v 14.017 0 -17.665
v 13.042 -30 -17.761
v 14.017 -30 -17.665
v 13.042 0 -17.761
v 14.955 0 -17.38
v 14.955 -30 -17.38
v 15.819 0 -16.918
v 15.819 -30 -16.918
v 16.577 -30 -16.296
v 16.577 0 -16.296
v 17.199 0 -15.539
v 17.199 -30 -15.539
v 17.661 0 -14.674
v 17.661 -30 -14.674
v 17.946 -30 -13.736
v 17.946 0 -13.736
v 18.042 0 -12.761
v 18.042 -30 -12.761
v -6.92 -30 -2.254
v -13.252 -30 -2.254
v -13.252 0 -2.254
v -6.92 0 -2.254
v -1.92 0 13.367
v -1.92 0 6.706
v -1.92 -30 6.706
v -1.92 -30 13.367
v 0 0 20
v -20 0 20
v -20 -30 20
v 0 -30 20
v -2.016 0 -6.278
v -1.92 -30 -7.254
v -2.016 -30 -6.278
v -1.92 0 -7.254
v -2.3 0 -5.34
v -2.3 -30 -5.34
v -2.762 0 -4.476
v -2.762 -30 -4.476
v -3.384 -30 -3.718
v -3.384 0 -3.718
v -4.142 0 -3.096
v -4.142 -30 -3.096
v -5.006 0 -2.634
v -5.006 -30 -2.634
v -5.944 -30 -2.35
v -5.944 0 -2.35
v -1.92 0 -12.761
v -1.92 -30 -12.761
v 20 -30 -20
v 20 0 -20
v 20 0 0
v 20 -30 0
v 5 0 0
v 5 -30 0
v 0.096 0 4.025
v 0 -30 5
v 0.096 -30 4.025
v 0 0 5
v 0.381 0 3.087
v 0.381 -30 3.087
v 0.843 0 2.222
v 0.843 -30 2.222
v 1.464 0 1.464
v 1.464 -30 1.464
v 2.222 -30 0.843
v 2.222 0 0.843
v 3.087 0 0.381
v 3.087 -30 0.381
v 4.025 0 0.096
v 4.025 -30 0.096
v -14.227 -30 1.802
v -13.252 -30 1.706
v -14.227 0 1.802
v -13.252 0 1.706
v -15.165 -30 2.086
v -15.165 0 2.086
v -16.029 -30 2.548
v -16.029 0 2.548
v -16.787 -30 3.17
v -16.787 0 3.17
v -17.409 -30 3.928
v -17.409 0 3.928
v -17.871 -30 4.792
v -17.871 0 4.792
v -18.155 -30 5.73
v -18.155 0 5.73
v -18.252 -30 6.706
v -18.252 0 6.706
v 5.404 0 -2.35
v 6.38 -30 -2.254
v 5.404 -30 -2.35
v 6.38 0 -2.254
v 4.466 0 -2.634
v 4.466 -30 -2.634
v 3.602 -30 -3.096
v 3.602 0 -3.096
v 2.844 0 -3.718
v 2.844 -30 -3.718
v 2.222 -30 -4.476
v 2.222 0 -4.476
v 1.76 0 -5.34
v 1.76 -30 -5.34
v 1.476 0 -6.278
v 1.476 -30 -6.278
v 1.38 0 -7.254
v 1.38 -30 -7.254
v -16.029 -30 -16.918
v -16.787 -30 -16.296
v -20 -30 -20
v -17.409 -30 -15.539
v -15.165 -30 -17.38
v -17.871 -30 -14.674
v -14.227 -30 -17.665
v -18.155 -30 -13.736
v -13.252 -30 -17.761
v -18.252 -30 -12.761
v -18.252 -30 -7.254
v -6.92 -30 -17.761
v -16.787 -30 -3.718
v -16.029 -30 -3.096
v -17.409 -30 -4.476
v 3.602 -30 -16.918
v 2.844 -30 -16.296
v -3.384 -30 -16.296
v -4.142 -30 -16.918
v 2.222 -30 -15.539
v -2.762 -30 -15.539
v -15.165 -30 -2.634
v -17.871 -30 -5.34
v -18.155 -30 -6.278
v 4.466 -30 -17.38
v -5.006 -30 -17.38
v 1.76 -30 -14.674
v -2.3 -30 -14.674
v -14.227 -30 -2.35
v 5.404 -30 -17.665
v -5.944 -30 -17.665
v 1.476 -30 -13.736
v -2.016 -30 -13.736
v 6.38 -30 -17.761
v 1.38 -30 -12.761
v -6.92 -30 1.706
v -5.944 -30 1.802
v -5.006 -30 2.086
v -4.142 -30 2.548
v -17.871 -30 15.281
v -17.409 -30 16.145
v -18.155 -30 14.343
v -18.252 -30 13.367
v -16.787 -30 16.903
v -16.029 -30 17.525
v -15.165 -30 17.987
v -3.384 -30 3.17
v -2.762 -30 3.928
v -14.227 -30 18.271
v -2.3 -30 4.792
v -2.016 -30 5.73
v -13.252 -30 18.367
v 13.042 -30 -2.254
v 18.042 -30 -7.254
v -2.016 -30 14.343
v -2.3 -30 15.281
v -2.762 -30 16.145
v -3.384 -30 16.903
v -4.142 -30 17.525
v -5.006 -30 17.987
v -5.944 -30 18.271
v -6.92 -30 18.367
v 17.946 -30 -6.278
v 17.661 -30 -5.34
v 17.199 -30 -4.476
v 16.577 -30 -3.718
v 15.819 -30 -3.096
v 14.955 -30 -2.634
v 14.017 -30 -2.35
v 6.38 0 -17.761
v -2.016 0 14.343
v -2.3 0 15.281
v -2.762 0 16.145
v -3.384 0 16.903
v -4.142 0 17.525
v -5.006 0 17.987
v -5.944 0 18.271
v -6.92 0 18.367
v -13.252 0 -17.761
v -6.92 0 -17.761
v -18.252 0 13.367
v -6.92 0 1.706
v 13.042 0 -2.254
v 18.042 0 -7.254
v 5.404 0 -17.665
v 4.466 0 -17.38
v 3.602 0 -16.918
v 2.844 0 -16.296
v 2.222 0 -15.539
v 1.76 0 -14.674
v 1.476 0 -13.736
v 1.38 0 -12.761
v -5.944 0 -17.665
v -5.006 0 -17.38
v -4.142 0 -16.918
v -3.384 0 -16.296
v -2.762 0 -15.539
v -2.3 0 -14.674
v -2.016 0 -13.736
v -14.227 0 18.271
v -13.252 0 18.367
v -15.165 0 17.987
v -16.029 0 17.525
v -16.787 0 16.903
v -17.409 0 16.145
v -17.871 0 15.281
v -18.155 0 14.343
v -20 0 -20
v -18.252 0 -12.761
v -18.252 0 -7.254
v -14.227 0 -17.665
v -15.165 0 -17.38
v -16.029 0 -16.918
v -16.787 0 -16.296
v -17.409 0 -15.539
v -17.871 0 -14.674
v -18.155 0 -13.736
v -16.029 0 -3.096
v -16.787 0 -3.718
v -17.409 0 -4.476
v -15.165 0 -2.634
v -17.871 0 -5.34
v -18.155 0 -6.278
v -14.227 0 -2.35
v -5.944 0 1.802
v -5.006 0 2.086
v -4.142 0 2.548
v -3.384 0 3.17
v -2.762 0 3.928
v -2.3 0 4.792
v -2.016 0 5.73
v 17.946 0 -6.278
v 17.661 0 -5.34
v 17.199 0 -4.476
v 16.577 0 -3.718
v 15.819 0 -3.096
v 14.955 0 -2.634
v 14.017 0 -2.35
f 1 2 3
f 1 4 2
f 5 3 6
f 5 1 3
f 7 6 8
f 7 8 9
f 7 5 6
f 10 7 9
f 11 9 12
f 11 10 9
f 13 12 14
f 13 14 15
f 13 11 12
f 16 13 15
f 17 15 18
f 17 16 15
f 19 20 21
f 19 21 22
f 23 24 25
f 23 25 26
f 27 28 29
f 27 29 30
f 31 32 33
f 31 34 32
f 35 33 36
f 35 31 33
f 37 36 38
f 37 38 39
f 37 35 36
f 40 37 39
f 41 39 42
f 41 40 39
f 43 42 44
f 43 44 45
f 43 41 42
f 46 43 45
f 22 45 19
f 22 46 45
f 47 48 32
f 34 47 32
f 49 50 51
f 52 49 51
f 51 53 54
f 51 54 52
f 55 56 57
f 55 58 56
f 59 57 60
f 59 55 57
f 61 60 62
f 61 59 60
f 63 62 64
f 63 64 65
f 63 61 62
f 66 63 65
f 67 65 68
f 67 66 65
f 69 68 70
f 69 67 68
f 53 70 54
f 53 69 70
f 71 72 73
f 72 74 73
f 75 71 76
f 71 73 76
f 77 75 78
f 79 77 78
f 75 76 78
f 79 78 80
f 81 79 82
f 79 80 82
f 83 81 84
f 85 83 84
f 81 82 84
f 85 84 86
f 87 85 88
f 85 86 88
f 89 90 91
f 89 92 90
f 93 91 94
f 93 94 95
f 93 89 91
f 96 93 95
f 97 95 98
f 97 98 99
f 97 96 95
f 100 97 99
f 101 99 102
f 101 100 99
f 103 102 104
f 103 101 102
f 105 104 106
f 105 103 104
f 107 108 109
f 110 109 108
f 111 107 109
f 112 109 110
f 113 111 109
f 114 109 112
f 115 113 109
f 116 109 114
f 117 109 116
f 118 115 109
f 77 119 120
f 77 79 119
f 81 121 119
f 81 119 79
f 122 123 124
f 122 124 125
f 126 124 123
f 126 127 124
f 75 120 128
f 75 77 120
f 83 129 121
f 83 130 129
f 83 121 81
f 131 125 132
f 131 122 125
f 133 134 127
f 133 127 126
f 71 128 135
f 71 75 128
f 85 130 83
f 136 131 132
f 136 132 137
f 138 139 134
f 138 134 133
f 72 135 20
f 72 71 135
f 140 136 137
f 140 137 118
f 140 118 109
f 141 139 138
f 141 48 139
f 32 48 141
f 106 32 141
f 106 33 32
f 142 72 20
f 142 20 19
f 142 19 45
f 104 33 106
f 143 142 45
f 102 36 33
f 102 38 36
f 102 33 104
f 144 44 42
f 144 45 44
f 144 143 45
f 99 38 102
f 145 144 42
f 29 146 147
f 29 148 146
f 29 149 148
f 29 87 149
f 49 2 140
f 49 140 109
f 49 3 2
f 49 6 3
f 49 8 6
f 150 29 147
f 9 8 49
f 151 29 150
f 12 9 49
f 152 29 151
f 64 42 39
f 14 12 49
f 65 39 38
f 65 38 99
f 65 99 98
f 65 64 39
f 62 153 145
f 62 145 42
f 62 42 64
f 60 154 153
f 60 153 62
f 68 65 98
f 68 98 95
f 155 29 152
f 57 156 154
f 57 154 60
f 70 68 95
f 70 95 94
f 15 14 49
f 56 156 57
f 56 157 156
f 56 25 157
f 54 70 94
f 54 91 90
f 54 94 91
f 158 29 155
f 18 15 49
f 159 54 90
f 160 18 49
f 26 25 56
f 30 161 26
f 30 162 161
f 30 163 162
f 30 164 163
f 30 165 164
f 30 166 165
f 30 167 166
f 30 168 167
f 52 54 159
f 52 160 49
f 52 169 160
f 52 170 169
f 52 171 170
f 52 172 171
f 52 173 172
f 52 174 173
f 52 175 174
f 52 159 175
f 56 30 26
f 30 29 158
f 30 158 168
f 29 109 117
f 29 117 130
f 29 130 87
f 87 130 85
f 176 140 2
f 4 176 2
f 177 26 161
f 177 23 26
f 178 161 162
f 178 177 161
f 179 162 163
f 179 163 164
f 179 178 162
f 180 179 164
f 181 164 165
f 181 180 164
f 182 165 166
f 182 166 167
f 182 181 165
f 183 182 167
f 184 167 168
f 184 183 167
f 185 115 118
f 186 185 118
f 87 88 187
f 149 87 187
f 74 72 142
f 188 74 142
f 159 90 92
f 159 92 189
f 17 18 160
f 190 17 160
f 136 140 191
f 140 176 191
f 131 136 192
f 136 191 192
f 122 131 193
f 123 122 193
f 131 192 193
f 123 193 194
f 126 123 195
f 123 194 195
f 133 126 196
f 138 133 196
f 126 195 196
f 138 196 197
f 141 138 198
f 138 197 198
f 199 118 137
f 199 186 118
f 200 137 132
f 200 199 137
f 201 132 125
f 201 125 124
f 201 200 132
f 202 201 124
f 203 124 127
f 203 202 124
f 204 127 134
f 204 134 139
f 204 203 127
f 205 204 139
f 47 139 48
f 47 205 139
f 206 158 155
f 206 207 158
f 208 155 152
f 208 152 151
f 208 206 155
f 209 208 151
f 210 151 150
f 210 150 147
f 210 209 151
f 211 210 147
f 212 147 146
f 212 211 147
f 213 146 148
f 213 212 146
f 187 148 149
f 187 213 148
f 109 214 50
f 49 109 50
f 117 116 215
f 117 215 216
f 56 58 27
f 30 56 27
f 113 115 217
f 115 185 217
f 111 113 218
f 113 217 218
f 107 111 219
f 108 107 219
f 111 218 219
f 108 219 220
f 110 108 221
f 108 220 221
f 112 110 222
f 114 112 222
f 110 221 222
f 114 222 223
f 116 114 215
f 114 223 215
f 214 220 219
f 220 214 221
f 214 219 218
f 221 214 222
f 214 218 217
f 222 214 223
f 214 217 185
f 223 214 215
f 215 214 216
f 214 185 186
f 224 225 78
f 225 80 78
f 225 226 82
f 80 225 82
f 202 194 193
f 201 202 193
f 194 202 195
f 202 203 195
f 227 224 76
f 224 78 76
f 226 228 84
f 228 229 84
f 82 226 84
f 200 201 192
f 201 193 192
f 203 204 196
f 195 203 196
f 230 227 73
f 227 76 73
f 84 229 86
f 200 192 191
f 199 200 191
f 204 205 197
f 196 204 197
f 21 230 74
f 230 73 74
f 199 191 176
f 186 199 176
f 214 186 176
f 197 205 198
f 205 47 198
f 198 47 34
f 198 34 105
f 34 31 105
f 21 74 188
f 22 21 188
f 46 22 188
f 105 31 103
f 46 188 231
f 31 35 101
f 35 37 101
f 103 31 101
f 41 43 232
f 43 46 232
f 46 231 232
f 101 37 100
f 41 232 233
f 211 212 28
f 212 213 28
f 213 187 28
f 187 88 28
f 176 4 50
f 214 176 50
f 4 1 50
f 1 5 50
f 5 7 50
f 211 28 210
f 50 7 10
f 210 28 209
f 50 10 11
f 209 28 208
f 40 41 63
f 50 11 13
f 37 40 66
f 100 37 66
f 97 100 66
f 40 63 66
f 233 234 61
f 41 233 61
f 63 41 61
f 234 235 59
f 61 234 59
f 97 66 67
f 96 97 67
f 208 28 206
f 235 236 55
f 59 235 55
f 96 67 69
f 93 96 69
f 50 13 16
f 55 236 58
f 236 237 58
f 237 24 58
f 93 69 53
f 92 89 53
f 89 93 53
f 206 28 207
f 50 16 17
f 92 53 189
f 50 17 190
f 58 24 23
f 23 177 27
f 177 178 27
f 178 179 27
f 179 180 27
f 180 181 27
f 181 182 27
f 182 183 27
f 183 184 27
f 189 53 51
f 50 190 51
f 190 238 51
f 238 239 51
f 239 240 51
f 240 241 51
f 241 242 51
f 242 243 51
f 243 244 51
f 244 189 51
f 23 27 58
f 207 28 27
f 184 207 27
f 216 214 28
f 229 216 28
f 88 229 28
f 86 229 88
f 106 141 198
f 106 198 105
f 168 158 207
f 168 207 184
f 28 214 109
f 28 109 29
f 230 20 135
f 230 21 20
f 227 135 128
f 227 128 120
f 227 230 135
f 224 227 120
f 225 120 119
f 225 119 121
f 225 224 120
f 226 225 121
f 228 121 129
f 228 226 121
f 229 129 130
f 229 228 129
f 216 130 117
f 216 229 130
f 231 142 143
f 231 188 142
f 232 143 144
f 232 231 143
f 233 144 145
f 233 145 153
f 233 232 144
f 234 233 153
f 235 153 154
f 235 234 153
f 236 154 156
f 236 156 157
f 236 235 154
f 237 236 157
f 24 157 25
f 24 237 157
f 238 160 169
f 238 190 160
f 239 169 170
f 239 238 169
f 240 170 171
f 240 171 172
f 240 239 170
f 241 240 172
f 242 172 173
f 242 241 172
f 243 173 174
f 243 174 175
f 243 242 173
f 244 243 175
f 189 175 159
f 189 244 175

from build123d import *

# Parameters (mm, degrees)
F0_W     = 40
F0_H     = 40
F1_DEPTH = 30
F2_W     = 20
F2_H     = 20
F2_W_2   = 16.331926
F2_H_2   = 16.661864
F2_H_3   = 15.507082
F2_W_3   = 16.661866
F3_DEPTH = 30
F4_R     = 5


with BuildPart() as f1:
    # F0 (on Front) → F1 (new body)
    with BuildSketch(Plane.XZ):
        Rectangle(F0_W, F0_H)
    extrude(amount=F1_DEPTH)

    # F2 (on face) → F3 (cut, through all)
    with BuildSketch(Plane.XZ.offset(30)):
        with Locations((10, 10)):
            Rectangle(F2_W, F2_H)
        with Locations((-10.085583, 10.036508)):
            Rectangle(F2_W_2, F2_H_2)
        with Locations((-10.085583, -10.00722)):
            Rectangle(F2_W_2, F2_H_3)
        with Locations((9.710691, -10.00722)):
            Rectangle(F2_W_3, F2_H_3)
    extrude(amount=-F3_DEPTH, mode=Mode.SUBTRACT)

    # F4
    f4_edges = [f1.edges().sort_by_distance(p)[0] for p in [
        (0, -15, 0),
        (-18.251546, -15, 18.36744),
        (-1.91962, -15, 18.36744),
        (-18.251546, -15, 1.705576),
        (-1.91962, -15, 1.705576),
        (-1.91962, -15, -17.760761),
        (18.041624, -15, -17.760761),
        (18.041624, -15, -2.253679),
        (-1.91962, -15, -2.253679),
        (-18.251546, -15, -2.253679),
        (1.379758, -15, -2.253679),
        (-18.251546, -15, -17.760761),
        (1.379758, -15, -17.760761),
    ]]
    fillet(f4_edges, radius=F4_R)


solid = f1.part
